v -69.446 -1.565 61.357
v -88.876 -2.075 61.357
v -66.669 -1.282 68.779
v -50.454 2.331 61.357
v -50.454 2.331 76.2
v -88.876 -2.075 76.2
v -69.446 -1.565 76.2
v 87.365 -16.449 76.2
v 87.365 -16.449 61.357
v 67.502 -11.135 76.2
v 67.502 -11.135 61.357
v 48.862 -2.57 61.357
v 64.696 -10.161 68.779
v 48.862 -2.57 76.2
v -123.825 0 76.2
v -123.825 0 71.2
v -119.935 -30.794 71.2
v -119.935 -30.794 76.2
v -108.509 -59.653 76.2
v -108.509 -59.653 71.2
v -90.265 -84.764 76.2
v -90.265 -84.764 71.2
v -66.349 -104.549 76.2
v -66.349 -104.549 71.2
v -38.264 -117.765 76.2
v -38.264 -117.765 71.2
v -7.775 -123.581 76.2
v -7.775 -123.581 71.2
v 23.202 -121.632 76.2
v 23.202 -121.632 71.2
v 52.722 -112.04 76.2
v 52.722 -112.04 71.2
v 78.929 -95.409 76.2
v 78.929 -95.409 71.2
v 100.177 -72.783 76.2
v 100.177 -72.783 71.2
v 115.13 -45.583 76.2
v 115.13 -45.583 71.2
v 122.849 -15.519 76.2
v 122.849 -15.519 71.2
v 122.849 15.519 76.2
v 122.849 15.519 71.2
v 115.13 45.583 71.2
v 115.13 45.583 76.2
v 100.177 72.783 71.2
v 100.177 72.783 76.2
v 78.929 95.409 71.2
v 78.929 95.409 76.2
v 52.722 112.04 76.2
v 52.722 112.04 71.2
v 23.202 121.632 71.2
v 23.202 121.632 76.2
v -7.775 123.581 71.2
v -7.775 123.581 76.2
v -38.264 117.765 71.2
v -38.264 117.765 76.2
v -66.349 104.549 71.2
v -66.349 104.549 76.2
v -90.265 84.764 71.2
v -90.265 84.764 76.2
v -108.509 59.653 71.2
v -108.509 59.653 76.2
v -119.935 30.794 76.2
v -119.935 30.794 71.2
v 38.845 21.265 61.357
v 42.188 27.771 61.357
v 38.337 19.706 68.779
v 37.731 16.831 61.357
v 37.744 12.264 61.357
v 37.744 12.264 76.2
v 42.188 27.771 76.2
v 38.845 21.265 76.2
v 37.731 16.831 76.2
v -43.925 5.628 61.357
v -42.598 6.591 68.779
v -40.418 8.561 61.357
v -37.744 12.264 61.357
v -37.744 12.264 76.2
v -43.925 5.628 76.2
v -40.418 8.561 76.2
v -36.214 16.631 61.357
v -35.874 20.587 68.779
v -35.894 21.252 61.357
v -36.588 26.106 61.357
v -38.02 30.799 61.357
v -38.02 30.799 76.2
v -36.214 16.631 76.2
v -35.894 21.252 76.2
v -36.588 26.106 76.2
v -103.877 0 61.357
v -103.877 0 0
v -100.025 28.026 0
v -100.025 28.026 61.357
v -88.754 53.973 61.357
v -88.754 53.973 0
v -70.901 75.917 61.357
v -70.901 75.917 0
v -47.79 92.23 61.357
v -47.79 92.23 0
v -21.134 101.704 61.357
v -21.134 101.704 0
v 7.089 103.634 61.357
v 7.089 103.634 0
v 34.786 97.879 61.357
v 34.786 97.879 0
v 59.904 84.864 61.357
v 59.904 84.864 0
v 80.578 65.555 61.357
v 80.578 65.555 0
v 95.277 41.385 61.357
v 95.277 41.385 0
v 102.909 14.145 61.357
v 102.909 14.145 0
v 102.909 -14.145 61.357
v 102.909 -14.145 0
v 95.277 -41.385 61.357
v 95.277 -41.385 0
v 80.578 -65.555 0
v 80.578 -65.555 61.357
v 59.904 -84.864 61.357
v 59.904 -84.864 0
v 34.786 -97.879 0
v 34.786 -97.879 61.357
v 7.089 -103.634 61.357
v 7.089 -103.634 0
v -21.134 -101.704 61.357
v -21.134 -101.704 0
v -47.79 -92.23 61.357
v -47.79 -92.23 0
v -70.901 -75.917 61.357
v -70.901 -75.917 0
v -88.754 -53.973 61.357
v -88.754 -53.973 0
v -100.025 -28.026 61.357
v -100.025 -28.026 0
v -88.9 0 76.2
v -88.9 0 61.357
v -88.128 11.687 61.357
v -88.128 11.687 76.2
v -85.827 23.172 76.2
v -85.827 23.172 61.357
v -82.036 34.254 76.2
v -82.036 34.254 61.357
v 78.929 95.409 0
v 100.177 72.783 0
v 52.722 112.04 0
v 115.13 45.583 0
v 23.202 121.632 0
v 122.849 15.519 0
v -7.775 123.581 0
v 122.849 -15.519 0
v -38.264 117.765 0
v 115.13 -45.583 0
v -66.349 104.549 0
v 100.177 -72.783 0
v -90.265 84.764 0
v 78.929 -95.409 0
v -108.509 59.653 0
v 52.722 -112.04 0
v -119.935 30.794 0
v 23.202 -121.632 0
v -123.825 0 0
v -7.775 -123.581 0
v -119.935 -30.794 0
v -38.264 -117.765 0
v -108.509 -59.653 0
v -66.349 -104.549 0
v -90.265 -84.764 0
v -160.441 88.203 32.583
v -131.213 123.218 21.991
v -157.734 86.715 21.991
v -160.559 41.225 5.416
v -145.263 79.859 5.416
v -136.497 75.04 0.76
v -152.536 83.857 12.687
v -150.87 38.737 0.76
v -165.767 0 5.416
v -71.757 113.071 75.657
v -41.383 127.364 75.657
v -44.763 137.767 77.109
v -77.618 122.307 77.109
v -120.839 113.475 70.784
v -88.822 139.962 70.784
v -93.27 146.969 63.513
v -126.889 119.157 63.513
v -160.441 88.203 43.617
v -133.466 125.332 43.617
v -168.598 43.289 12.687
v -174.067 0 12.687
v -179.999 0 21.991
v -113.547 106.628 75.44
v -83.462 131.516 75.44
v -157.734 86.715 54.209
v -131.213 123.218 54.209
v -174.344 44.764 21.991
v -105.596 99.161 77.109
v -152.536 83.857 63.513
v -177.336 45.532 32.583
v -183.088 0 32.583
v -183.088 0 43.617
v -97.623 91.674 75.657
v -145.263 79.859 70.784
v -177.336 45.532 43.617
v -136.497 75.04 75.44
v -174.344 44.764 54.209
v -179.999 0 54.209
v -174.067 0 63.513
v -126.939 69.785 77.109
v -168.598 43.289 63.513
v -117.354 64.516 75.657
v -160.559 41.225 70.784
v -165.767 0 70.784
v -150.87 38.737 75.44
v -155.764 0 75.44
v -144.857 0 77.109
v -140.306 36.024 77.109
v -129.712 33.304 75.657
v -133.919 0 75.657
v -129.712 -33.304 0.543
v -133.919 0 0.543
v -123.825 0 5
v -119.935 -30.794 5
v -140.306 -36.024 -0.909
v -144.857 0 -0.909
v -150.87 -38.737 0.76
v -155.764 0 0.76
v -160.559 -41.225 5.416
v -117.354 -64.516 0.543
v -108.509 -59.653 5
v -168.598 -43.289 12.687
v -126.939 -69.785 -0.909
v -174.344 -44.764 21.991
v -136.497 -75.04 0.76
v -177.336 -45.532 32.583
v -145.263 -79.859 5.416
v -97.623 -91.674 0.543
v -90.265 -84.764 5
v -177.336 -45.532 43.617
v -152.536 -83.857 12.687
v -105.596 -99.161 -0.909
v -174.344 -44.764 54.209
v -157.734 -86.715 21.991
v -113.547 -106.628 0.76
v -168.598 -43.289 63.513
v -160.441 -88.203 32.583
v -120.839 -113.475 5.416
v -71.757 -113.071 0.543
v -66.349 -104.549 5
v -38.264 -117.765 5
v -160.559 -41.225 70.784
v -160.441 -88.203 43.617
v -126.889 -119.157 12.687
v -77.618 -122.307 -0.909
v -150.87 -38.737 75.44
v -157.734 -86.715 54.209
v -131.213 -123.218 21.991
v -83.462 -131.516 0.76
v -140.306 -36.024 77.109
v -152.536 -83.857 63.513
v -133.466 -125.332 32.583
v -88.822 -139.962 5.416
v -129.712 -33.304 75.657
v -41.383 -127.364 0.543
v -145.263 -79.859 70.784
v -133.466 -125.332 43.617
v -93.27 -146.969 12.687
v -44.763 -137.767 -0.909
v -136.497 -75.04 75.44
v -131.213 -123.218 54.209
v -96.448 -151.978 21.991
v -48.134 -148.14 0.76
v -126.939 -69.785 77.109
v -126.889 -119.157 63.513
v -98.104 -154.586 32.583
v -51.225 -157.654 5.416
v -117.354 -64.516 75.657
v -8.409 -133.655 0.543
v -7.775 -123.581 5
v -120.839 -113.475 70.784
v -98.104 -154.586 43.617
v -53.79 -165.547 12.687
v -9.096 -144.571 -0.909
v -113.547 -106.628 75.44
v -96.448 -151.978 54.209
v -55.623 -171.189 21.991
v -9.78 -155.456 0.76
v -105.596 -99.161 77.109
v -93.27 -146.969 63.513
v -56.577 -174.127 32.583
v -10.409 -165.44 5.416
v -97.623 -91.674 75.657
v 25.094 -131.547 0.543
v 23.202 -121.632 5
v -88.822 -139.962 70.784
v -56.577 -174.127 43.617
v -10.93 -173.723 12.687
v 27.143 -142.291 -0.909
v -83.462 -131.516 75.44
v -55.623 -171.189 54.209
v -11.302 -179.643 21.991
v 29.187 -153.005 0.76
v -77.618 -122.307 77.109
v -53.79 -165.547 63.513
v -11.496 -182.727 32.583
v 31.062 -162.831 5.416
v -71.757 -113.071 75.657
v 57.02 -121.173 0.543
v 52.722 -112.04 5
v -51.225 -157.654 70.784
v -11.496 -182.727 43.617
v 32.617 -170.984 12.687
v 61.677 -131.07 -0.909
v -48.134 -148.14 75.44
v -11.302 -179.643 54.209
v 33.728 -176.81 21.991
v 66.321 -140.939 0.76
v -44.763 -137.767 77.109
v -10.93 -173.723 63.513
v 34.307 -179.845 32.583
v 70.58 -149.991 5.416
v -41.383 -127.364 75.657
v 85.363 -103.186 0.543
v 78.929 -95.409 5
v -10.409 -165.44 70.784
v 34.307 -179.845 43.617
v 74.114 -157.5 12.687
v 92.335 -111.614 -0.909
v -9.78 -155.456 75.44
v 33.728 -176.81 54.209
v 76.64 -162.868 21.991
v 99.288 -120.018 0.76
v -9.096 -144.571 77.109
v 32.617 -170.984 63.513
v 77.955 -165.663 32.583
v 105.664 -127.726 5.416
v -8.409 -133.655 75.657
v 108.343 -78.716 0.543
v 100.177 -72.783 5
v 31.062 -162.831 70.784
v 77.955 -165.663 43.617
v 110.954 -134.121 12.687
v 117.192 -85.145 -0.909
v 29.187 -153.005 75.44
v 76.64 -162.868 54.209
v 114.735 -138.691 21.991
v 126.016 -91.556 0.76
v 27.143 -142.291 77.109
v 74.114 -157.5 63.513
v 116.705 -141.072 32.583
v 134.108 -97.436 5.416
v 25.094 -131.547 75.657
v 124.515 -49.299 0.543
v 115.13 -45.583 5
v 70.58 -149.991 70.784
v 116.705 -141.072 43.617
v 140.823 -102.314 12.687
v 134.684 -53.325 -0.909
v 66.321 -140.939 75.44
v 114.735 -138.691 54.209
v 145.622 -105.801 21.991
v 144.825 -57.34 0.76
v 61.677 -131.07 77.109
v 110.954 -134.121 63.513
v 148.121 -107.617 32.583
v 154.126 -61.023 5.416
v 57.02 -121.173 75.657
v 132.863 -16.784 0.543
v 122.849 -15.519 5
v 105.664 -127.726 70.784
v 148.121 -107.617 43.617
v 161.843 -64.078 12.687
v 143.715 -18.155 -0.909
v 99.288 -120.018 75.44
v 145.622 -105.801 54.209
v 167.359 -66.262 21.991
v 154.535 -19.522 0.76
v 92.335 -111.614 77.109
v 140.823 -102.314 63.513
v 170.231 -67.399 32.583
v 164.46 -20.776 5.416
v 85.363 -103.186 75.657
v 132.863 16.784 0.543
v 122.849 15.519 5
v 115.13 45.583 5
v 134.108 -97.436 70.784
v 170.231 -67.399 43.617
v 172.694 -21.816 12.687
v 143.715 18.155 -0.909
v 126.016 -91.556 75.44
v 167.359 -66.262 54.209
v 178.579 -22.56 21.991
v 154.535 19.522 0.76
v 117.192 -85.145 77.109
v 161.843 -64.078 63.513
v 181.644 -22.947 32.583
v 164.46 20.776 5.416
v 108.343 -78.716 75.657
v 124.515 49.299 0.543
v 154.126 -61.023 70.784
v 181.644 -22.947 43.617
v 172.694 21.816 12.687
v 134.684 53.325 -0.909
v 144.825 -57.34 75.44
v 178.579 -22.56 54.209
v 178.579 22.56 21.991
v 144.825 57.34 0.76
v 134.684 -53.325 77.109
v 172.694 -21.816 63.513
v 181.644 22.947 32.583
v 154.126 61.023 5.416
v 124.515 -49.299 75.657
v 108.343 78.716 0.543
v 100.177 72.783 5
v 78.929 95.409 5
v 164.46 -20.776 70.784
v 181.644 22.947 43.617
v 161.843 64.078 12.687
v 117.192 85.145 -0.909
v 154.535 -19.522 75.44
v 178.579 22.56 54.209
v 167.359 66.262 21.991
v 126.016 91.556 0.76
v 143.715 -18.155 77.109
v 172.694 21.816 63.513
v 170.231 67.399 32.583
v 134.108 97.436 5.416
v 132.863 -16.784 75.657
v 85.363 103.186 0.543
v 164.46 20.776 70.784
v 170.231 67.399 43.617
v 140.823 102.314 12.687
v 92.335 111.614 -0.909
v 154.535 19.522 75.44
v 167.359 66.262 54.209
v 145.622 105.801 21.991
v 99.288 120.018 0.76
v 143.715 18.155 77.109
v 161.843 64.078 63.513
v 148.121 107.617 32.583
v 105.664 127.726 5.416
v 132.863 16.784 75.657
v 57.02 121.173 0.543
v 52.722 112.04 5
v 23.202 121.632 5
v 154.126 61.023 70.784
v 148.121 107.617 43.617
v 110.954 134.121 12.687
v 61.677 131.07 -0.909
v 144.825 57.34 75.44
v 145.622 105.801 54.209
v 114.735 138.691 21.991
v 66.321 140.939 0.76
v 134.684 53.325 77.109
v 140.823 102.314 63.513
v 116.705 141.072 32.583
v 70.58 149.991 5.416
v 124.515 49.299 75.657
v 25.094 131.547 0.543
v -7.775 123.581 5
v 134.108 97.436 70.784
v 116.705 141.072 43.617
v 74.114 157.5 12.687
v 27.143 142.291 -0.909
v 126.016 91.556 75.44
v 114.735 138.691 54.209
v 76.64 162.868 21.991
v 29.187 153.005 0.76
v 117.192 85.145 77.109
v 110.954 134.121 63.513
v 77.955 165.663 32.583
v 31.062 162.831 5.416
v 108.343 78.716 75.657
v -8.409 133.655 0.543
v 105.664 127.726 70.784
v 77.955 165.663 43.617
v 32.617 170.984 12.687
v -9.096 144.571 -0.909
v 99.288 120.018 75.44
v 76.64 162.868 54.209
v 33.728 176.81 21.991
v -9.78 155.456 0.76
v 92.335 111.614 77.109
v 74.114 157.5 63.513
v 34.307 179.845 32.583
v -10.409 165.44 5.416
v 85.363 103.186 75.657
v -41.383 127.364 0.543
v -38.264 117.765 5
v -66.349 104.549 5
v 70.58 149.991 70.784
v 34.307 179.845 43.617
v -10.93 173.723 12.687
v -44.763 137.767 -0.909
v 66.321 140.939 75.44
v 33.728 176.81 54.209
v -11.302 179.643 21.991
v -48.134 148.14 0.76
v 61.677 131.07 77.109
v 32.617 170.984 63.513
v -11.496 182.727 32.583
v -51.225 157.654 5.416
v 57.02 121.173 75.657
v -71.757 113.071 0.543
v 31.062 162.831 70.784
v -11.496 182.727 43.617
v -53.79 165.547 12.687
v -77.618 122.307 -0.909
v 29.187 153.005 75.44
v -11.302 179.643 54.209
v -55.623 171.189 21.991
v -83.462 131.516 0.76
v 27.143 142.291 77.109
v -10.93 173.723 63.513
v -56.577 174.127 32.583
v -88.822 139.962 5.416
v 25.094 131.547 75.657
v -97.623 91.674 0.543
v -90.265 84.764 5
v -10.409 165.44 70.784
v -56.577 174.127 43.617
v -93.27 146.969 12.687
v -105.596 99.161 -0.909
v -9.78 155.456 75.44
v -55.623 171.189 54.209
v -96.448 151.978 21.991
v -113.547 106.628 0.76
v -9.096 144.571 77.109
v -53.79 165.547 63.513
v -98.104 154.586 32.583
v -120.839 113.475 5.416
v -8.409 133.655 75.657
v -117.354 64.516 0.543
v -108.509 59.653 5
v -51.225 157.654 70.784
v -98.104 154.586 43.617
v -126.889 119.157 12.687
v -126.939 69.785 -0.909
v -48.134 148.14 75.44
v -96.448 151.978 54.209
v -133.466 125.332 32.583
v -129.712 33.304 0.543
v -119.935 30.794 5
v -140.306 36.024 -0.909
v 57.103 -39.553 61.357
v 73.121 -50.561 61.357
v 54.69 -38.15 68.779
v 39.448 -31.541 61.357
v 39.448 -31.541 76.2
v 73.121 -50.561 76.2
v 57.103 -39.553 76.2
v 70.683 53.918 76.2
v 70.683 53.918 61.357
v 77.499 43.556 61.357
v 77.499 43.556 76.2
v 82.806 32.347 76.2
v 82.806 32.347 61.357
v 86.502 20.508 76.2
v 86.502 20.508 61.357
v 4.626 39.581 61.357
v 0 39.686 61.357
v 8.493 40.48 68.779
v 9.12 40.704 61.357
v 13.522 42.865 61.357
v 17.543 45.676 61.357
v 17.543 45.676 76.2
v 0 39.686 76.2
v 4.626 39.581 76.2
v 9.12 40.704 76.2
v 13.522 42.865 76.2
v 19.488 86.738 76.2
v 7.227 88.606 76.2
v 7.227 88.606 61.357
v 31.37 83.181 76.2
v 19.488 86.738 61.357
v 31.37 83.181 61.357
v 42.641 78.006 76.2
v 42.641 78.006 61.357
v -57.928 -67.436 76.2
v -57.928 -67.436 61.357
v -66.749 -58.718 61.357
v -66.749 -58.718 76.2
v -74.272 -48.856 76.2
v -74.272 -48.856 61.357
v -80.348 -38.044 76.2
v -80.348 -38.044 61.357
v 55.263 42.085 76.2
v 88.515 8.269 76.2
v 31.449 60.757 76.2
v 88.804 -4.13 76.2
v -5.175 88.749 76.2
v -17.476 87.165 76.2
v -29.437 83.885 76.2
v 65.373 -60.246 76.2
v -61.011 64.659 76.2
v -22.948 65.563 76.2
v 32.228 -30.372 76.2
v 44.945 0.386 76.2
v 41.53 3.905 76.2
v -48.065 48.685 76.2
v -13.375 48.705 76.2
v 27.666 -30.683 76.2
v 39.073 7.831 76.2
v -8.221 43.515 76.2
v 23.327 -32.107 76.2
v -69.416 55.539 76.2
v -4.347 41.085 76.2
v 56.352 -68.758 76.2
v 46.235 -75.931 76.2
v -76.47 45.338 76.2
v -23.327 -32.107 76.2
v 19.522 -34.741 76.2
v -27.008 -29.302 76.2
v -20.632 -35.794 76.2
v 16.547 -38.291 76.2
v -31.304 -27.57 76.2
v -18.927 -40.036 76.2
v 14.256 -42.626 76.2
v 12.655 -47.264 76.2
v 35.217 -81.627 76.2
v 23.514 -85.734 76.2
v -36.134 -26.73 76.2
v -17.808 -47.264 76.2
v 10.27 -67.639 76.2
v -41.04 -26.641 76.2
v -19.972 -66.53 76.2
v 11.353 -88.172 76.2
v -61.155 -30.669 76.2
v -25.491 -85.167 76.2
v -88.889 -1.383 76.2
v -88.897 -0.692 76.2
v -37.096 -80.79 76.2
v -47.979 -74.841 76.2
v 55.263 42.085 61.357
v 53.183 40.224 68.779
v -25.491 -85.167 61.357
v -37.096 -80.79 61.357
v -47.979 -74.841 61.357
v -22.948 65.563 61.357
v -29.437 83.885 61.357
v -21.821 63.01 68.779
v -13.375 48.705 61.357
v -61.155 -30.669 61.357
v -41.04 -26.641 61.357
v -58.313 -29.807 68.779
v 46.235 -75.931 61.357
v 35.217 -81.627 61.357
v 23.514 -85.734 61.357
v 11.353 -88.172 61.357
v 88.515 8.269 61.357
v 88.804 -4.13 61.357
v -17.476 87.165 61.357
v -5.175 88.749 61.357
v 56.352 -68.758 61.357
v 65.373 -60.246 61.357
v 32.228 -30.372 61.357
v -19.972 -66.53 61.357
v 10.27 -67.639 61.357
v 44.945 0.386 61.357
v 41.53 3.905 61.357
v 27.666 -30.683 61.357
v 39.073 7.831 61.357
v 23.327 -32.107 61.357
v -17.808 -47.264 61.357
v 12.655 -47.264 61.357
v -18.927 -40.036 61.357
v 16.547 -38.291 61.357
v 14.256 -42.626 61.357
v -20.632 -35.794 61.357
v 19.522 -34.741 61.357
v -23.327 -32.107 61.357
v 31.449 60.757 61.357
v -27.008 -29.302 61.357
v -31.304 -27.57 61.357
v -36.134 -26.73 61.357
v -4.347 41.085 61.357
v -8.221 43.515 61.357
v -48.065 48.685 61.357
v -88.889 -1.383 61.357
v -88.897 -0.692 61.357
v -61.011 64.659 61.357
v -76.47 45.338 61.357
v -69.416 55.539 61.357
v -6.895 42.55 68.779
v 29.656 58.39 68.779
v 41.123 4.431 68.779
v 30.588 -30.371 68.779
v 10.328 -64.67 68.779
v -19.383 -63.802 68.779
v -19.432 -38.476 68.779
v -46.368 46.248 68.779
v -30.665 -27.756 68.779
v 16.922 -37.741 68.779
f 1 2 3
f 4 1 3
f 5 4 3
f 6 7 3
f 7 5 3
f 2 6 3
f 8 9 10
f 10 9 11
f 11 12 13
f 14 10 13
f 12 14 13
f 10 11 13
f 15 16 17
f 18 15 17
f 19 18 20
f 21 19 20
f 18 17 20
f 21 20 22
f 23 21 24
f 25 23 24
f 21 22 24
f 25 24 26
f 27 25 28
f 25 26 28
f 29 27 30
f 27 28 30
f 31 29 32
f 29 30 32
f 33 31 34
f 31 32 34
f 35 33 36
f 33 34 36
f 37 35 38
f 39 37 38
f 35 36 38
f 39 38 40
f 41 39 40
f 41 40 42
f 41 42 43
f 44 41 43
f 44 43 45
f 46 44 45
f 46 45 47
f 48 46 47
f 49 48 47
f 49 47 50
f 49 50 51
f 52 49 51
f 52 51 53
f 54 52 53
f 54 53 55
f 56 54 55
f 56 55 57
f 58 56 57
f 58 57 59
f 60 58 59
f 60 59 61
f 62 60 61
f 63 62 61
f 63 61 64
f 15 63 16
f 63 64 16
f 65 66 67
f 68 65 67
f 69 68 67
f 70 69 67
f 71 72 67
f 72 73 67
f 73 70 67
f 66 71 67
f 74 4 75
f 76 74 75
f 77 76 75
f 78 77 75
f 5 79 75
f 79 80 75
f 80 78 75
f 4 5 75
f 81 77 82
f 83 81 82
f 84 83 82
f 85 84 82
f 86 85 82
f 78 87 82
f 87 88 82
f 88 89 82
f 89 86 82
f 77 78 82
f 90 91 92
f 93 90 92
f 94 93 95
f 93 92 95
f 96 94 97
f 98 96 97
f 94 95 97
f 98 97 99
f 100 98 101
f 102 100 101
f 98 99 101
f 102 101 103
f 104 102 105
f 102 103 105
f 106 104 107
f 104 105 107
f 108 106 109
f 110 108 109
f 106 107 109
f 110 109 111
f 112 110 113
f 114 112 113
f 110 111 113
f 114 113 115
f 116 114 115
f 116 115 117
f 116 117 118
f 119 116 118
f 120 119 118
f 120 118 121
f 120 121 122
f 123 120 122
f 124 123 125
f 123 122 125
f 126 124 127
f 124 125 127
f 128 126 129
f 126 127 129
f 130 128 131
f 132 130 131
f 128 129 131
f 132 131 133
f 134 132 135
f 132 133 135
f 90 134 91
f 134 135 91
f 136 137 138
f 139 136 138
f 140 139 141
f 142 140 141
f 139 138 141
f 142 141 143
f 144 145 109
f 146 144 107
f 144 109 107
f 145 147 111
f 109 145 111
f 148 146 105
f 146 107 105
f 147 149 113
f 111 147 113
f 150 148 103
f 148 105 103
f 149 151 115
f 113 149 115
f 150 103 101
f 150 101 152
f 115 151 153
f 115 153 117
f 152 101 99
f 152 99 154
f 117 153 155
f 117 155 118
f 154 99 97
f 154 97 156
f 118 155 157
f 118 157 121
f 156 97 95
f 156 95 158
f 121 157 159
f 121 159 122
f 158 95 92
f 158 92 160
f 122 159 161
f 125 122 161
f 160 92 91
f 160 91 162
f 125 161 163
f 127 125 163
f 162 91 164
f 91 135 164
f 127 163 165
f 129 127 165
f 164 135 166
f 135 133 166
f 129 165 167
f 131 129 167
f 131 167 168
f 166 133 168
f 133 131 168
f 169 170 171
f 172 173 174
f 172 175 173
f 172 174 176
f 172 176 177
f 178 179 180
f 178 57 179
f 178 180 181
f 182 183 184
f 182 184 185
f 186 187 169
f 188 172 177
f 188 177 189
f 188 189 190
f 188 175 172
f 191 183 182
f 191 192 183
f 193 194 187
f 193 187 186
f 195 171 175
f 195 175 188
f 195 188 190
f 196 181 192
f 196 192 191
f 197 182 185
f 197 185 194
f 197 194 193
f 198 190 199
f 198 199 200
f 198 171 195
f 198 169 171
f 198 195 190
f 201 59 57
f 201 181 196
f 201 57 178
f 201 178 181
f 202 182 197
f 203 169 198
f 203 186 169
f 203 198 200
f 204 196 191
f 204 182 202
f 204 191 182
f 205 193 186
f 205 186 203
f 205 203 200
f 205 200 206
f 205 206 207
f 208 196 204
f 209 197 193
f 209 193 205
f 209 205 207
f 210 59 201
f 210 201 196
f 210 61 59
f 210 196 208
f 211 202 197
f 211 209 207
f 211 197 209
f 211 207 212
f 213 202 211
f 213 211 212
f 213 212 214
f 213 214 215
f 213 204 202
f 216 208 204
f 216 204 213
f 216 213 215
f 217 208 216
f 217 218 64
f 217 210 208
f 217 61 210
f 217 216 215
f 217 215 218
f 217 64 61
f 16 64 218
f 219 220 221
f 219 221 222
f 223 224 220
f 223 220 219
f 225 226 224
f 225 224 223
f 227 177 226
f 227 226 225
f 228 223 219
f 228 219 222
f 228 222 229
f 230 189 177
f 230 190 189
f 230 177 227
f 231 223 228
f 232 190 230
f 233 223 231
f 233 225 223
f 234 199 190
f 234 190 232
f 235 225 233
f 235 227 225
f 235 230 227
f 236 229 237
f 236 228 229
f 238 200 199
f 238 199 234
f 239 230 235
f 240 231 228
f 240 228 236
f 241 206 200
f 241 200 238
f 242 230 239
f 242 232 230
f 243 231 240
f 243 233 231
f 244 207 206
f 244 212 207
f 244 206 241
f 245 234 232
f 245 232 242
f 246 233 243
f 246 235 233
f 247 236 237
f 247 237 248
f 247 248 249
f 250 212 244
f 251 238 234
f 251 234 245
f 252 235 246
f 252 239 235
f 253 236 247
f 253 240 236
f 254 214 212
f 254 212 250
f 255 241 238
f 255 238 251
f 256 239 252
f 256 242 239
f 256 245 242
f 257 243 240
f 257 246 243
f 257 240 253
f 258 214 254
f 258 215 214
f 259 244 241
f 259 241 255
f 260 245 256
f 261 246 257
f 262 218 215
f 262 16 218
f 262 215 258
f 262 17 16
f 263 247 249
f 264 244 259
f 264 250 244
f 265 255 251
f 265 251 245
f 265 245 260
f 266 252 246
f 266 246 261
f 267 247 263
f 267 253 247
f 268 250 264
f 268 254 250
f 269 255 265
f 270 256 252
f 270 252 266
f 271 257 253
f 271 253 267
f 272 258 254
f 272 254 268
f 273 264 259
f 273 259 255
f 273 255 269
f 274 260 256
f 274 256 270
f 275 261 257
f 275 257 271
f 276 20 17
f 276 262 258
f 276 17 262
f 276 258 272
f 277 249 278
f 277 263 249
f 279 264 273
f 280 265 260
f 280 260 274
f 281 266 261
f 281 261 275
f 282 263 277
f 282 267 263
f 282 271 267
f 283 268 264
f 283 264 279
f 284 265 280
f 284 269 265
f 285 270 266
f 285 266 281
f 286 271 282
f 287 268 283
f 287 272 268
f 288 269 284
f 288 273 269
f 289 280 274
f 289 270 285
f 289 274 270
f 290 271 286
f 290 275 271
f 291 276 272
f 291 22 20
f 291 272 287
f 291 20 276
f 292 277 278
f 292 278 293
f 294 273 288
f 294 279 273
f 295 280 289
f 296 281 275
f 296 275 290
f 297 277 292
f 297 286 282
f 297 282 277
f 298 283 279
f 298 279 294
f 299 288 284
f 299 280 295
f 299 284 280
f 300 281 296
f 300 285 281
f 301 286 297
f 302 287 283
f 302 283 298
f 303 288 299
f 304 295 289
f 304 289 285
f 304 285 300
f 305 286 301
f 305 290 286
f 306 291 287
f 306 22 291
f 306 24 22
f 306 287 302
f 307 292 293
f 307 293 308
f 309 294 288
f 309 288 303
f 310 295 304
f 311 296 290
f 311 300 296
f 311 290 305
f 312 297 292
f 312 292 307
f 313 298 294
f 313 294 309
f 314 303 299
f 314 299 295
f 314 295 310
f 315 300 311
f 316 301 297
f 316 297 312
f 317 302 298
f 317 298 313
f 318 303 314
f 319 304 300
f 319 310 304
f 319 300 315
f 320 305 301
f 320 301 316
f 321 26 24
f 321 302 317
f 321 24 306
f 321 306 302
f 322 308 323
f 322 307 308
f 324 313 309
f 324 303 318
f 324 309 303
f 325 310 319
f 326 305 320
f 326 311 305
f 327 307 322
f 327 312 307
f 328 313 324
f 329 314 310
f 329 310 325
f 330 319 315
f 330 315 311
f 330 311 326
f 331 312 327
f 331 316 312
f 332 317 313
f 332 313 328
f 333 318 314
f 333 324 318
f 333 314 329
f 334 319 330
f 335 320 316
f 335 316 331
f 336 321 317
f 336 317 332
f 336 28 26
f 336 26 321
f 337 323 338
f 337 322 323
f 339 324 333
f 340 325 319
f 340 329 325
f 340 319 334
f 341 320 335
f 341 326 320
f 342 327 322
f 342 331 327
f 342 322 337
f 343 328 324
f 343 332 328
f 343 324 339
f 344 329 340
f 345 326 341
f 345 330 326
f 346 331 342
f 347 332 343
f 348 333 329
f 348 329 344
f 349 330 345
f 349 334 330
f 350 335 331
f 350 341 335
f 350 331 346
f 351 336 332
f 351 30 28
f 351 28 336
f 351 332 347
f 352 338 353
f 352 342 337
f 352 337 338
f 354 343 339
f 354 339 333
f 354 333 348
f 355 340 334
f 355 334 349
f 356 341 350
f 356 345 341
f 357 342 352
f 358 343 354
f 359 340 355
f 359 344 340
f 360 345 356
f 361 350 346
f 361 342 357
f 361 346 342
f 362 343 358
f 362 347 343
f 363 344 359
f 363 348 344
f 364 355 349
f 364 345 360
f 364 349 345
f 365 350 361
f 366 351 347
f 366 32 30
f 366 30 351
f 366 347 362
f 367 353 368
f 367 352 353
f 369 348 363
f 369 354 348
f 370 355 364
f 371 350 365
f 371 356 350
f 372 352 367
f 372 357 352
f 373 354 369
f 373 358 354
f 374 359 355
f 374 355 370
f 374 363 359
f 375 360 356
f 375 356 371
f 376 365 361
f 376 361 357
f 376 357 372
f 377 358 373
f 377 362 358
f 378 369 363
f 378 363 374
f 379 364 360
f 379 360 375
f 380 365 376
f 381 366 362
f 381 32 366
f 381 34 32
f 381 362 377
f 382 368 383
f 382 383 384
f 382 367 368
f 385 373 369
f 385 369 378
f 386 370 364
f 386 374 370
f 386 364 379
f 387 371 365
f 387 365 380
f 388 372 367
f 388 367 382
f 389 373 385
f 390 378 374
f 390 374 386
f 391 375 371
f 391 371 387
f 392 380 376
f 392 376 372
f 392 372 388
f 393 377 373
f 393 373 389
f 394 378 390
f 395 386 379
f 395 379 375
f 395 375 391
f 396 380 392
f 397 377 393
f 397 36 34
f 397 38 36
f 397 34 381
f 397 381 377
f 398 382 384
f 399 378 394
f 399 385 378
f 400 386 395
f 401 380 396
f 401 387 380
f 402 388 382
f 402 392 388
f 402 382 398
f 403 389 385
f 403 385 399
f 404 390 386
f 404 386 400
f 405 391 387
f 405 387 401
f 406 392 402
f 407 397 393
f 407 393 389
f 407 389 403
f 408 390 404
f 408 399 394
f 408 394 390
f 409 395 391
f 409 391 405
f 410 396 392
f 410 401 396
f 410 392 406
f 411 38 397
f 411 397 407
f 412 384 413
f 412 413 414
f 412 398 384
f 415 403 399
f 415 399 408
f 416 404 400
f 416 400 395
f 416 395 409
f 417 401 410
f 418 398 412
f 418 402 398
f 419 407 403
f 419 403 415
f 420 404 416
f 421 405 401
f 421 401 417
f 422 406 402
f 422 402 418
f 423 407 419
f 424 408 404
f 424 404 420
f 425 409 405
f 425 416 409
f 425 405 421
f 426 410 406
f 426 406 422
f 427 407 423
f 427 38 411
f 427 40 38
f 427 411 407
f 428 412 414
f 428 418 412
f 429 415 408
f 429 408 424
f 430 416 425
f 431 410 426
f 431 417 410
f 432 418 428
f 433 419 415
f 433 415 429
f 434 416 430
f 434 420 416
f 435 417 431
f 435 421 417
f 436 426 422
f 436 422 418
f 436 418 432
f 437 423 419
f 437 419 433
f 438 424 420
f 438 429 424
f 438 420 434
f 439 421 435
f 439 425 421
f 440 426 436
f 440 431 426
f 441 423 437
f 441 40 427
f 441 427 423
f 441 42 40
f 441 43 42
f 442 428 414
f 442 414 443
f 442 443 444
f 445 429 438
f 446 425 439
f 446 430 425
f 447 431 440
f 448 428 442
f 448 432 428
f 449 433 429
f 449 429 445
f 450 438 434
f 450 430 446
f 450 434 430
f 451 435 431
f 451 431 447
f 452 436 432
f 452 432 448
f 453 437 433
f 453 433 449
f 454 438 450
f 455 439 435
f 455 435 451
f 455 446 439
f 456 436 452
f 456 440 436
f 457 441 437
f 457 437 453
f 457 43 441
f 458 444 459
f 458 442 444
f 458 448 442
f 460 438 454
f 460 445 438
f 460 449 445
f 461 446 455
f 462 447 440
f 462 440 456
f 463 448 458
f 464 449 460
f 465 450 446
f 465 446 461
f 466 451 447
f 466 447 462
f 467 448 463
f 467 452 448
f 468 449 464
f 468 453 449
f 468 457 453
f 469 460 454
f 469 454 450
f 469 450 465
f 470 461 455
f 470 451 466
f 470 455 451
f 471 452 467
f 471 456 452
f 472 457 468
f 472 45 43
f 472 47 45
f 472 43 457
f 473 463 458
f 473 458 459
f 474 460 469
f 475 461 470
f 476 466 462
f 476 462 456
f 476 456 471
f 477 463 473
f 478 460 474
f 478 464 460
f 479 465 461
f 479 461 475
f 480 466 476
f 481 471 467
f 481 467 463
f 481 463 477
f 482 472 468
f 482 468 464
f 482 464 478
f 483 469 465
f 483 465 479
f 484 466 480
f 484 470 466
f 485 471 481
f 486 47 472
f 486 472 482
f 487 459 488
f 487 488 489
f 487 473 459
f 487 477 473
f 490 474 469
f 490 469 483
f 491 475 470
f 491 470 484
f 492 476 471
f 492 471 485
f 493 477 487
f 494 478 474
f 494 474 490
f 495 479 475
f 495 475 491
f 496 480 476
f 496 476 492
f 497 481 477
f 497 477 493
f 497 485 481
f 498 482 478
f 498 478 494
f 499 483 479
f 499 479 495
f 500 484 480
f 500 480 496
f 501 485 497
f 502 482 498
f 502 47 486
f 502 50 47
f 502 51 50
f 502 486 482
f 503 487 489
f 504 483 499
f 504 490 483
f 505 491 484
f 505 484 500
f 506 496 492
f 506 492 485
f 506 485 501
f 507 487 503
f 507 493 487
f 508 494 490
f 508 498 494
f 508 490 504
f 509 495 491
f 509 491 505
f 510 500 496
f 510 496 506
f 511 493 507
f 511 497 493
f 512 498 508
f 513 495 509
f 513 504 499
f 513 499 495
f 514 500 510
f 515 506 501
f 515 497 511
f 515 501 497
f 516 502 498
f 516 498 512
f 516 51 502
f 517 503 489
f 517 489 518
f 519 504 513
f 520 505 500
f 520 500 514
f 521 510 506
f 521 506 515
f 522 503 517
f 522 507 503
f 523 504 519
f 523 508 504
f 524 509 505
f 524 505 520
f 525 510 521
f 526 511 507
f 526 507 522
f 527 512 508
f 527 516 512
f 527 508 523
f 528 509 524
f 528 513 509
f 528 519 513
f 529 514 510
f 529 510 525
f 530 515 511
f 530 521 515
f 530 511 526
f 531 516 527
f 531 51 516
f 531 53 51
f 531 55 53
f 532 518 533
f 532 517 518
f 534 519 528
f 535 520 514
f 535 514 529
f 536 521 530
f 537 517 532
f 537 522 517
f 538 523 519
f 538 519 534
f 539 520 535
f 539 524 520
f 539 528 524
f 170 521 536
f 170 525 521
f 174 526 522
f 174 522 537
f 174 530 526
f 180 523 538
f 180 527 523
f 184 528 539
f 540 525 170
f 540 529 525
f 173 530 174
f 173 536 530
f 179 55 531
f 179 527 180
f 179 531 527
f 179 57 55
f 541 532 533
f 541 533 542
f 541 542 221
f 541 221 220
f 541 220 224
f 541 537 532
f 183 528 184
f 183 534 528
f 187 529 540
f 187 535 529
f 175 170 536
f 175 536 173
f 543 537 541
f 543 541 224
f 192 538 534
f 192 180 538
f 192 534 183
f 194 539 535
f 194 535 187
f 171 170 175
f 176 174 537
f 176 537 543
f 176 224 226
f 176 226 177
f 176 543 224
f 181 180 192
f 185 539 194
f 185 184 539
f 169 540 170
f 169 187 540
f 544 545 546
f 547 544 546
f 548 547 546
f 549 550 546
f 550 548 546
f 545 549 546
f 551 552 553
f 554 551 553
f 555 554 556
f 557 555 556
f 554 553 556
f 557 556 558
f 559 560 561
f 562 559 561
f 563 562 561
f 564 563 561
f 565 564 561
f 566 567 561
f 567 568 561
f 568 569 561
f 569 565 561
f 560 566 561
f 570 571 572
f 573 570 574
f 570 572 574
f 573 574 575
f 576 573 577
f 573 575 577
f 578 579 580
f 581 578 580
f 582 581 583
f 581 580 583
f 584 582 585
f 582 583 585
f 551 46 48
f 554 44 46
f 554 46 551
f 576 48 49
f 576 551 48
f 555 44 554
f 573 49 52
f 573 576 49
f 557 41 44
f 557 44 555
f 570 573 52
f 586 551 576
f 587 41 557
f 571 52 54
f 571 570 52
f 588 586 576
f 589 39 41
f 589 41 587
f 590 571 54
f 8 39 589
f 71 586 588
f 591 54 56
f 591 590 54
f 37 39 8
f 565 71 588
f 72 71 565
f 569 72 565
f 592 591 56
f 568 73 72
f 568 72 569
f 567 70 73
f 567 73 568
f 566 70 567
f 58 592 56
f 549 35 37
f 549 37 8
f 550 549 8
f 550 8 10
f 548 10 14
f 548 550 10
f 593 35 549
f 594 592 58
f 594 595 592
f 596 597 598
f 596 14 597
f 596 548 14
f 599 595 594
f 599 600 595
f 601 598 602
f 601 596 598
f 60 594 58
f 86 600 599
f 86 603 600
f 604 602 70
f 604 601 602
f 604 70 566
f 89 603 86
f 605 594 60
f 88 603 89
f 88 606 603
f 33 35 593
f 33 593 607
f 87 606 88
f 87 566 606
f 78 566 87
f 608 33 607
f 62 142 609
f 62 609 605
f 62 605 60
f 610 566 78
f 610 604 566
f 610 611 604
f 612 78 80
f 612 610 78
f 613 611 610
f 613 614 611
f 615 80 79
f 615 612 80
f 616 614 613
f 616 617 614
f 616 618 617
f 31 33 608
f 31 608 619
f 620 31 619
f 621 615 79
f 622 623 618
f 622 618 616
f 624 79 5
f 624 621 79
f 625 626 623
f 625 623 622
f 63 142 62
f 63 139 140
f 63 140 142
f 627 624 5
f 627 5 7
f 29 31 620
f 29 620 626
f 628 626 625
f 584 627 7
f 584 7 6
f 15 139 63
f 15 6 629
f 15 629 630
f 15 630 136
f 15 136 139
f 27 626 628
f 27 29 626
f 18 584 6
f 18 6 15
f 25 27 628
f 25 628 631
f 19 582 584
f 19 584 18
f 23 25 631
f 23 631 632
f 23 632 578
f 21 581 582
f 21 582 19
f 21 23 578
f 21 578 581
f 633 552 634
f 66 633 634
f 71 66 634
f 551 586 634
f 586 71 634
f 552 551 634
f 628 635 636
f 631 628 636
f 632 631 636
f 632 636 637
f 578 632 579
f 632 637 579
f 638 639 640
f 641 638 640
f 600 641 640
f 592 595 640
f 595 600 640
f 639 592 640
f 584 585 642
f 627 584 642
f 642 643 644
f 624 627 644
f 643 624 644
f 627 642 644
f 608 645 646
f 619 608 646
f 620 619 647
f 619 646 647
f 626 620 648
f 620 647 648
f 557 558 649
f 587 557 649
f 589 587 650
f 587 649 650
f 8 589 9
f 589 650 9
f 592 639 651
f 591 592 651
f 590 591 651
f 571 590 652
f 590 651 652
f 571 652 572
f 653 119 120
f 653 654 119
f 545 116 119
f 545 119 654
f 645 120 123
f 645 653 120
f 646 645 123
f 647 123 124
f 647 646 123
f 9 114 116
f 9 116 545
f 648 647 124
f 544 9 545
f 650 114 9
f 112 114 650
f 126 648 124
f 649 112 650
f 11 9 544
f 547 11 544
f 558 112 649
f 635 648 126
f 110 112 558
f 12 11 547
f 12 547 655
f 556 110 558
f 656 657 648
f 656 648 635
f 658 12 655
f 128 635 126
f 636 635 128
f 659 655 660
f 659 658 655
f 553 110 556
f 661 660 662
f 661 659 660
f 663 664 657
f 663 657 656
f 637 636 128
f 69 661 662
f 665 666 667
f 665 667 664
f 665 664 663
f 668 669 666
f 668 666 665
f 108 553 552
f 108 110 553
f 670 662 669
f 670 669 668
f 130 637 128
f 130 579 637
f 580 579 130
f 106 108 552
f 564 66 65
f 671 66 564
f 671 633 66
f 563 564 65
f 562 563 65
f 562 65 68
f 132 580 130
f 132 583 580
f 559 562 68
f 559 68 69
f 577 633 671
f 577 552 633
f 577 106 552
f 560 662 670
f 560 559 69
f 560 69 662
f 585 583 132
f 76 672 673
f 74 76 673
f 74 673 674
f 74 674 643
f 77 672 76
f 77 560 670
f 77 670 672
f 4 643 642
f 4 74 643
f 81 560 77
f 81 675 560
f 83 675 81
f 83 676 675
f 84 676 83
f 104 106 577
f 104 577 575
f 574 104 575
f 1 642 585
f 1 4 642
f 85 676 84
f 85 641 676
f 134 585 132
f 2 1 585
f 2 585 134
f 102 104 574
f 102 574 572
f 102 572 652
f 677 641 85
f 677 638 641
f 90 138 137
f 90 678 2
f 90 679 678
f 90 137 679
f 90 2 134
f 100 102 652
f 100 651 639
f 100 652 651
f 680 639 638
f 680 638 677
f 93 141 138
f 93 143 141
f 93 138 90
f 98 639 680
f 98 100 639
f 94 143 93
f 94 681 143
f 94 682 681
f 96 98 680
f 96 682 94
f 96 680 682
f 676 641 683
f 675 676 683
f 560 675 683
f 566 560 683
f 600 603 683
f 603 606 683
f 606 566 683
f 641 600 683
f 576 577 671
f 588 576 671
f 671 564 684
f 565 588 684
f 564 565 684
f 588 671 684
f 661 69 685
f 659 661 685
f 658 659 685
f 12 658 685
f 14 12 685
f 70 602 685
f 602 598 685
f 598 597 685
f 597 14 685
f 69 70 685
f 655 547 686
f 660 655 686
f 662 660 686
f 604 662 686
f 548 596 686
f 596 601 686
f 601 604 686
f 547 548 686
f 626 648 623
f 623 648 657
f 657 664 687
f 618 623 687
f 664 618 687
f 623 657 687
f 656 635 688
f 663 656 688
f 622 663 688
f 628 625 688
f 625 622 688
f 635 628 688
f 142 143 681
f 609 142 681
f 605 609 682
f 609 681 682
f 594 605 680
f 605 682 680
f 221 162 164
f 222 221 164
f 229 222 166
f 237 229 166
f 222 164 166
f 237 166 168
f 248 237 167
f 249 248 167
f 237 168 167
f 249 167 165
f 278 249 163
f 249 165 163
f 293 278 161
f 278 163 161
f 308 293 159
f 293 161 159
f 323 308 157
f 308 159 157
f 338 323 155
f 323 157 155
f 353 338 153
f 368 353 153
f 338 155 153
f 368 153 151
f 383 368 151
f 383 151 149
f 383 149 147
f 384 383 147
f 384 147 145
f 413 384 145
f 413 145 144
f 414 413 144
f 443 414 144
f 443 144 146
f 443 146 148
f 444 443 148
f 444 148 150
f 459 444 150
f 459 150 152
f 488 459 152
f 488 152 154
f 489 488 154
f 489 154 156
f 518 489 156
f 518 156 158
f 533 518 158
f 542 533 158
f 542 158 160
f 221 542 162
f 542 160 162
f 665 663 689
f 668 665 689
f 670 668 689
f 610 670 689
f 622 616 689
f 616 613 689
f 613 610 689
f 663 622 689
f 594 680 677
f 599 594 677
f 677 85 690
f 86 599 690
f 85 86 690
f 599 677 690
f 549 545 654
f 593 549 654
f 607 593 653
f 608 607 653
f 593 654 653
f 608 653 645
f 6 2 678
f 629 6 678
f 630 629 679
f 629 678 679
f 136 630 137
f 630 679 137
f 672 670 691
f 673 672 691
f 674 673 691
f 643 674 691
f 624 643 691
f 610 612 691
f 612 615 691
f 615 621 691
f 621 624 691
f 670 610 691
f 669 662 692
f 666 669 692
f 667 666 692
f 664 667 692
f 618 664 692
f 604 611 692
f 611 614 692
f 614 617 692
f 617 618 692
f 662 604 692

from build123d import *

# Parameters (mm, degrees)
SKETCH1_R      = 123.825
EXTRUDE1_DEPTH = 76.2
SKETCH4_W      = 17.455227324
SKETCH4_H      = 66.2
EXTRUDE7_DEPTH = 191.975656171
SKETCH8_R      = 103.876598788
EXTRUDE8_DEPTH = 61.357082


with BuildPart() as part:
    # Sketch1 → Extrude1 (new body)
    with BuildSketch(Plane.XY):
        with Locations(Location((0, 0, 0), (0, 0, 180))):
            Circle(SKETCH1_R)
    extrude(amount=EXTRUDE1_DEPTH)

    # Sketch4 → Cut-Revolve1 (revolve, cut)
    with BuildSketch(Plane(origin=(0, 0, 0), x_dir=(1, 0, 0), z_dir=(0, 1, 0)), mode=Mode.PRIVATE) as cut_revolve1_sk:
        with Locations((115.097386338, -38.1)):
            Rectangle(SKETCH4_W, SKETCH4_H)
    revolve(cut_revolve1_sk.sketch.rotate(Axis((0, 0, 0), (0, 0, 1)), 180), axis=Axis((0, 0, 0), (0, 0, 1)), mode=Mode.SUBTRACT)

    # Sketch2 → Extrude7 (cut, through all)
    with BuildSketch(Plane(origin=(0, 0, 0), x_dir=(-1, 0, 0), z_dir=(0, 0, -1))):
        with BuildLine():
            add(Edge.make_bspline(
                [(-87.364978695, -16.449027254), (-61.27965147, -10.813441939), (-48.861717362, -2.569537789)],
                knots=[0, 0, 0, 0.288609818, 0.288609818, 0.288609818], degree=2))
            Line((-48.861717362, -2.569537789), (-55.5625, 18.053350622))
            Line((-55.5625, 18.053350622), (-42.187847239, 27.77060465))
            add(Edge.make_bspline(
                [(-42.187847239, 27.77060465), (-49.93088885, 39.603142144), (-70.682590657, 53.918284265)],
                knots=[0.718431192, 0.718431192, 0.718431192, 1, 1, 1], degree=2))
            Line((-70.682590657, 53.918284265), (-86.502301571, 20.507604026))
            Line((-86.502301571, 20.507604026), (-87.364978695, -16.449027254))
        make_face()
        with BuildLine():
            Line((-86.502301571, 20.507604026), (-70.682590657, 53.918284265))
            ThreePointArc((-70.682590657, 53.918284265), (-80.348248112, 38.044303454), (-86.502301571, 20.507604026))
        make_face()
        with BuildLine():
            ThreePointArc((-86.502301571, 20.507604026), (-88.875789367, 2.074623896), (-87.364978695, -16.449027254))
            Line((-87.364978695, -16.449027254), (-86.502301571, 20.507604026))
        make_face()
        with BuildLine():
            add(Edge.make_bspline(
                [(-48.861717362, -2.569537789), (-38.943167303, 4.015098212), (-37.743952233, 12.263753494)],
                knots=[0.288609818, 0.288609818, 0.288609818, 0.519130523, 0.519130523, 0.519130523], degree=2))
            add(Edge.make_bspline(
                [(-37.743952233, 12.263753494), (-36.707150073, 19.395271291), (-42.187847239, 27.77060465)],
                knots=[0.519130523, 0.519130523, 0.519130523, 0.718431192, 0.718431192, 0.718431192], degree=2))
            Line((-42.187847239, 27.77060465), (-55.5625, 18.053350622))
            Line((-55.5625, 18.053350622), (-48.861717362, -2.569537789))
        make_face()
        with BuildLine():
            add(Edge.make_bspline(
                [(-11.353308573, -88.172061246), (-8.652259294, -61.621949174), (-12.655325381, -47.264285539)],
                knots=[0, 0, 0, 0.288609818, 0.288609818, 0.288609818], degree=2))
            Line((-12.655325381, -47.264285539), (-34.3395135, -47.264285539))
            Line((-34.3395135, -47.264285539), (-39.448176267, -31.541438244))
            add(Edge.make_bspline(
                [(-39.448176267, -31.541438244), (-53.094319601, -35.249053252), (-73.121457317, -50.561472287)],
                knots=[0.718431192, 0.718431192, 0.718431192, 1, 1, 1], degree=2))
            Line((-73.121457317, -50.561472287), (-46.234571681, -75.931379426))
            Line((-46.234571681, -75.931379426), (-11.353308573, -88.172061246))
        make_face()
        with BuildLine():
            add(Edge.make_bspline(
                [(-12.655325381, -47.264285539), (-15.852685829, -35.796419447), (-23.32704535, -32.106923477)],
                knots=[0.288609818, 0.288609818, 0.288609818, 0.519130523, 0.519130523, 0.519130523], degree=2))
            add(Edge.make_bspline(
                [(-23.32704535, -32.106923477), (-29.789132335, -28.917105832), (-39.448176267, -31.541438244)],
                knots=[0.519130523, 0.519130523, 0.519130523, 0.718431192, 0.718431192, 0.718431192], degree=2))
            Line((-39.448176267, -31.541438244), (-34.3395135, -47.264285539))
            Line((-34.3395135, -47.264285539), (-12.655325381, -47.264285539))
        make_face()
        with BuildLine():
            Line((-46.234571681, -75.931379426), (-73.121457317, -50.561472287))
            ThreePointArc((-73.121457317, -50.561472287), (-61.011256843, -64.659388633), (-46.234571681, -75.931379426))
        make_face()
        with BuildLine():
            ThreePointArc((-46.234571681, -75.931379426), (-29.437213878, -83.884804578), (-11.353308573, -88.172061246))
            Line((-11.353308573, -88.172061246), (-46.234571681, -75.931379426))
        make_face()
        with BuildLine():
            ThreePointArc((57.927764817, -67.435777324), (70.682590657, -53.918284265), (80.348248112, -38.044303454))
            Line((80.348248112, -38.044303454), (57.927764817, -67.435777324))
        make_face()
        with BuildLine():
            add(Edge.make_bspline(
                [(80.348248112, -38.044303454), (55.932261147, -27.271017104), (41.040296138, -26.641397128)],
                knots=[0, 0, 0, 0.288609818, 0.288609818, 0.288609818], degree=2))
            Line((41.040296138, -26.641397128), (34.3395135, -47.264285539))
            Line((34.3395135, -47.264285539), (17.807533512, -47.264285539))
            add(Edge.make_bspline(
                [(17.807533512, -47.264285539), (17.116794728, -61.388255125), (25.491044728, -85.16699266)],
                knots=[0.718431192, 0.718431192, 0.718431192, 1, 1, 1], degree=2))
            Line((25.491044728, -85.16699266), (57.927764817, -67.435777324))
            Line((57.927764817, -67.435777324), (80.348248112, -38.044303454))
        make_face()
        with BuildLine():
            add(Edge.make_bspline(
                [(41.040296138, -26.641397128), (29.145668647, -26.138502105), (23.32704535, -32.106923477)],
                knots=[0.288609818, 0.288609818, 0.288609818, 0.519130523, 0.519130523, 0.519130523], degree=2))
            add(Edge.make_bspline(
                [(23.32704535, -32.106923477), (18.296453795, -37.267025552), (17.807533512, -47.264285539)],
                knots=[0.519130523, 0.519130523, 0.519130523, 0.718431192, 0.718431192, 0.718431192], degree=2))
            Line((17.807533512, -47.264285539), (34.3395135, -47.264285539))
            Line((34.3395135, -47.264285539), (41.040296138, -26.641397128))
        make_face()
        with BuildLine():
            Line((57.927764817, -67.435777324), (25.491044728, -85.16699266))
            ThreePointArc((25.491044728, -85.16699266), (42.641217687, -78.006003322), (57.927764817, -67.435777324))
        make_face()
        with BuildLine():
            add(Edge.make_bspline(
                [(61.011256843, 64.659388633), (43.220297751, 44.767533696), (38.019623302, 30.798996606)],
                knots=[0, 0, 0, 0.288609818, 0.288609818, 0.288609818], degree=2))
            Line((38.019623302, 30.798996606), (55.5625, 18.053350622))
            Line((55.5625, 18.053350622), (50.453837233, 2.330503327))
            add(Edge.make_bspline(
                [(50.453837233, 2.330503327), (63.673080521, -2.690974925), (88.875789367, -2.074623896)],
                knots=[0.718431192, 0.718431192, 0.718431192, 1, 1, 1], degree=2))
            Line((88.875789367, -2.074623896), (82.03589923, 34.253776982))
            Line((82.03589923, 34.253776982), (61.011256843, 64.659388633))
        make_face()
        with BuildLine():
            add(Edge.make_bspline(
                [(38.019623302, 30.798996606), (33.865699678, 19.641936731), (37.743952233, 12.263753494)],
                knots=[0.288609818, 0.288609818, 0.288609818, 0.519130523, 0.519130523, 0.519130523], degree=2))
            add(Edge.make_bspline(
                [(37.743952233, 12.263753494), (41.096962653, 5.884817381), (50.453837233, 2.330503327)],
                knots=[0.519130523, 0.519130523, 0.519130523, 0.718431192, 0.718431192, 0.718431192], degree=2))
            Line((50.453837233, 2.330503327), (55.5625, 18.053350622))
            Line((55.5625, 18.053350622), (38.019623302, 30.798996606))
        make_face()
        with BuildLine():
            ThreePointArc((82.03589923, 34.253776982), (73.121457317, 50.561472287), (61.011256843, 64.659388633))
            Line((61.011256843, 64.659388633), (82.03589923, 34.253776982))
        make_face()
        with BuildLine():
            Line((82.03589923, 34.253776982), (88.875789367, -2.074623896))
            ThreePointArc((88.875789367, -2.074623896), (88.893947136, -1.037382579), (88.9, 0))
            ThreePointArc((88.9, 0), (87.167085077, 17.467377571), (82.03589923, 34.253776982))
        make_face()
        with BuildLine():
            add(Edge.make_bspline(
                [(-42.641217687, 78.006003322), (-29.220648133, 54.938874521), (-17.542876698, 45.67622385)],
                knots=[0, 0, 0, 0.288609818, 0.288609818, 0.288609818], degree=2))
            Line((-17.542876698, 45.67622385), (0, 58.421869834))
            Line((0, 58.421869834), (13.374652761, 48.704615806))
            add(Edge.make_bspline(
                [(13.374652761, 48.704615806), (22.235333203, 59.725141159), (29.437213878, 83.884804578)],
                knots=[0.718431192, 0.718431192, 0.718431192, 1, 1, 1], degree=2))
            Line((29.437213878, 83.884804578), (-7.226790795, 88.605775742))
            Line((-7.226790795, 88.605775742), (-42.641217687, 78.006003322))
        make_face()
        with BuildLine():
            ThreePointArc((-7.226790795, 88.605775742), (-25.491044728, 85.16699266), (-42.641217687, 78.006003322))
            Line((-42.641217687, 78.006003322), (-7.226790795, 88.605775742))
        make_face()
        with BuildLine():
            add(Edge.make_bspline(
                [(-17.542876698, 45.67622385), (-8.215515194, 38.27788661), (0, 39.686339966)],
                knots=[0.288609818, 0.288609818, 0.288609818, 0.519130523, 0.519130523, 0.519130523], degree=2))
            add(Edge.make_bspline(
                [(0, 39.686339966), (7.102865959, 40.904042711), (13.374652761, 48.704615806)],
                knots=[0.519130523, 0.519130523, 0.519130523, 0.718431192, 0.718431192, 0.718431192], degree=2))
            Line((13.374652761, 48.704615806), (0, 58.421869834))
            Line((0, 58.421869834), (-17.542876698, 45.67622385))
        make_face()
        with BuildLine():
            Line((-7.226790795, 88.605775742), (29.437213878, 83.884804578))
            ThreePointArc((29.437213878, 83.884804578), (11.353308573, 88.172061246), (-7.226790795, 88.605775742))
        make_face()
    extrude(amount=-EXTRUDE7_DEPTH, mode=Mode.SUBTRACT)

    # Sketch5 → Revolve1 (revolve)
    with BuildSketch(Plane(origin=(0, 0, 0), x_dir=(1, 0, 0), z_dir=(0, 1, 0))):
        with BuildLine():
            Line((-123.825, -71.2), (-106.369772676, -71.2))
            Line((-106.369772676, -71.2), (-106.369772676, -5))
            Line((-106.369772676, -5), (-123.825, -5))
            ThreePointArc((-123.825, -5), (-183.480240999, -38.1), (-123.825, -71.2))
        make_face()
    revolve(axis=Axis((0, 0, 0), (0, 0, 1)))

    # Sketch8 → Extrude8 (cut)
    with BuildSketch(Plane(origin=(0, 0, 0), x_dir=(-1, 0, 0), z_dir=(0, 0, -1))):
        Circle(SKETCH8_R)
    extrude(amount=-EXTRUDE8_DEPTH, mode=Mode.SUBTRACT)


solid = part.part
